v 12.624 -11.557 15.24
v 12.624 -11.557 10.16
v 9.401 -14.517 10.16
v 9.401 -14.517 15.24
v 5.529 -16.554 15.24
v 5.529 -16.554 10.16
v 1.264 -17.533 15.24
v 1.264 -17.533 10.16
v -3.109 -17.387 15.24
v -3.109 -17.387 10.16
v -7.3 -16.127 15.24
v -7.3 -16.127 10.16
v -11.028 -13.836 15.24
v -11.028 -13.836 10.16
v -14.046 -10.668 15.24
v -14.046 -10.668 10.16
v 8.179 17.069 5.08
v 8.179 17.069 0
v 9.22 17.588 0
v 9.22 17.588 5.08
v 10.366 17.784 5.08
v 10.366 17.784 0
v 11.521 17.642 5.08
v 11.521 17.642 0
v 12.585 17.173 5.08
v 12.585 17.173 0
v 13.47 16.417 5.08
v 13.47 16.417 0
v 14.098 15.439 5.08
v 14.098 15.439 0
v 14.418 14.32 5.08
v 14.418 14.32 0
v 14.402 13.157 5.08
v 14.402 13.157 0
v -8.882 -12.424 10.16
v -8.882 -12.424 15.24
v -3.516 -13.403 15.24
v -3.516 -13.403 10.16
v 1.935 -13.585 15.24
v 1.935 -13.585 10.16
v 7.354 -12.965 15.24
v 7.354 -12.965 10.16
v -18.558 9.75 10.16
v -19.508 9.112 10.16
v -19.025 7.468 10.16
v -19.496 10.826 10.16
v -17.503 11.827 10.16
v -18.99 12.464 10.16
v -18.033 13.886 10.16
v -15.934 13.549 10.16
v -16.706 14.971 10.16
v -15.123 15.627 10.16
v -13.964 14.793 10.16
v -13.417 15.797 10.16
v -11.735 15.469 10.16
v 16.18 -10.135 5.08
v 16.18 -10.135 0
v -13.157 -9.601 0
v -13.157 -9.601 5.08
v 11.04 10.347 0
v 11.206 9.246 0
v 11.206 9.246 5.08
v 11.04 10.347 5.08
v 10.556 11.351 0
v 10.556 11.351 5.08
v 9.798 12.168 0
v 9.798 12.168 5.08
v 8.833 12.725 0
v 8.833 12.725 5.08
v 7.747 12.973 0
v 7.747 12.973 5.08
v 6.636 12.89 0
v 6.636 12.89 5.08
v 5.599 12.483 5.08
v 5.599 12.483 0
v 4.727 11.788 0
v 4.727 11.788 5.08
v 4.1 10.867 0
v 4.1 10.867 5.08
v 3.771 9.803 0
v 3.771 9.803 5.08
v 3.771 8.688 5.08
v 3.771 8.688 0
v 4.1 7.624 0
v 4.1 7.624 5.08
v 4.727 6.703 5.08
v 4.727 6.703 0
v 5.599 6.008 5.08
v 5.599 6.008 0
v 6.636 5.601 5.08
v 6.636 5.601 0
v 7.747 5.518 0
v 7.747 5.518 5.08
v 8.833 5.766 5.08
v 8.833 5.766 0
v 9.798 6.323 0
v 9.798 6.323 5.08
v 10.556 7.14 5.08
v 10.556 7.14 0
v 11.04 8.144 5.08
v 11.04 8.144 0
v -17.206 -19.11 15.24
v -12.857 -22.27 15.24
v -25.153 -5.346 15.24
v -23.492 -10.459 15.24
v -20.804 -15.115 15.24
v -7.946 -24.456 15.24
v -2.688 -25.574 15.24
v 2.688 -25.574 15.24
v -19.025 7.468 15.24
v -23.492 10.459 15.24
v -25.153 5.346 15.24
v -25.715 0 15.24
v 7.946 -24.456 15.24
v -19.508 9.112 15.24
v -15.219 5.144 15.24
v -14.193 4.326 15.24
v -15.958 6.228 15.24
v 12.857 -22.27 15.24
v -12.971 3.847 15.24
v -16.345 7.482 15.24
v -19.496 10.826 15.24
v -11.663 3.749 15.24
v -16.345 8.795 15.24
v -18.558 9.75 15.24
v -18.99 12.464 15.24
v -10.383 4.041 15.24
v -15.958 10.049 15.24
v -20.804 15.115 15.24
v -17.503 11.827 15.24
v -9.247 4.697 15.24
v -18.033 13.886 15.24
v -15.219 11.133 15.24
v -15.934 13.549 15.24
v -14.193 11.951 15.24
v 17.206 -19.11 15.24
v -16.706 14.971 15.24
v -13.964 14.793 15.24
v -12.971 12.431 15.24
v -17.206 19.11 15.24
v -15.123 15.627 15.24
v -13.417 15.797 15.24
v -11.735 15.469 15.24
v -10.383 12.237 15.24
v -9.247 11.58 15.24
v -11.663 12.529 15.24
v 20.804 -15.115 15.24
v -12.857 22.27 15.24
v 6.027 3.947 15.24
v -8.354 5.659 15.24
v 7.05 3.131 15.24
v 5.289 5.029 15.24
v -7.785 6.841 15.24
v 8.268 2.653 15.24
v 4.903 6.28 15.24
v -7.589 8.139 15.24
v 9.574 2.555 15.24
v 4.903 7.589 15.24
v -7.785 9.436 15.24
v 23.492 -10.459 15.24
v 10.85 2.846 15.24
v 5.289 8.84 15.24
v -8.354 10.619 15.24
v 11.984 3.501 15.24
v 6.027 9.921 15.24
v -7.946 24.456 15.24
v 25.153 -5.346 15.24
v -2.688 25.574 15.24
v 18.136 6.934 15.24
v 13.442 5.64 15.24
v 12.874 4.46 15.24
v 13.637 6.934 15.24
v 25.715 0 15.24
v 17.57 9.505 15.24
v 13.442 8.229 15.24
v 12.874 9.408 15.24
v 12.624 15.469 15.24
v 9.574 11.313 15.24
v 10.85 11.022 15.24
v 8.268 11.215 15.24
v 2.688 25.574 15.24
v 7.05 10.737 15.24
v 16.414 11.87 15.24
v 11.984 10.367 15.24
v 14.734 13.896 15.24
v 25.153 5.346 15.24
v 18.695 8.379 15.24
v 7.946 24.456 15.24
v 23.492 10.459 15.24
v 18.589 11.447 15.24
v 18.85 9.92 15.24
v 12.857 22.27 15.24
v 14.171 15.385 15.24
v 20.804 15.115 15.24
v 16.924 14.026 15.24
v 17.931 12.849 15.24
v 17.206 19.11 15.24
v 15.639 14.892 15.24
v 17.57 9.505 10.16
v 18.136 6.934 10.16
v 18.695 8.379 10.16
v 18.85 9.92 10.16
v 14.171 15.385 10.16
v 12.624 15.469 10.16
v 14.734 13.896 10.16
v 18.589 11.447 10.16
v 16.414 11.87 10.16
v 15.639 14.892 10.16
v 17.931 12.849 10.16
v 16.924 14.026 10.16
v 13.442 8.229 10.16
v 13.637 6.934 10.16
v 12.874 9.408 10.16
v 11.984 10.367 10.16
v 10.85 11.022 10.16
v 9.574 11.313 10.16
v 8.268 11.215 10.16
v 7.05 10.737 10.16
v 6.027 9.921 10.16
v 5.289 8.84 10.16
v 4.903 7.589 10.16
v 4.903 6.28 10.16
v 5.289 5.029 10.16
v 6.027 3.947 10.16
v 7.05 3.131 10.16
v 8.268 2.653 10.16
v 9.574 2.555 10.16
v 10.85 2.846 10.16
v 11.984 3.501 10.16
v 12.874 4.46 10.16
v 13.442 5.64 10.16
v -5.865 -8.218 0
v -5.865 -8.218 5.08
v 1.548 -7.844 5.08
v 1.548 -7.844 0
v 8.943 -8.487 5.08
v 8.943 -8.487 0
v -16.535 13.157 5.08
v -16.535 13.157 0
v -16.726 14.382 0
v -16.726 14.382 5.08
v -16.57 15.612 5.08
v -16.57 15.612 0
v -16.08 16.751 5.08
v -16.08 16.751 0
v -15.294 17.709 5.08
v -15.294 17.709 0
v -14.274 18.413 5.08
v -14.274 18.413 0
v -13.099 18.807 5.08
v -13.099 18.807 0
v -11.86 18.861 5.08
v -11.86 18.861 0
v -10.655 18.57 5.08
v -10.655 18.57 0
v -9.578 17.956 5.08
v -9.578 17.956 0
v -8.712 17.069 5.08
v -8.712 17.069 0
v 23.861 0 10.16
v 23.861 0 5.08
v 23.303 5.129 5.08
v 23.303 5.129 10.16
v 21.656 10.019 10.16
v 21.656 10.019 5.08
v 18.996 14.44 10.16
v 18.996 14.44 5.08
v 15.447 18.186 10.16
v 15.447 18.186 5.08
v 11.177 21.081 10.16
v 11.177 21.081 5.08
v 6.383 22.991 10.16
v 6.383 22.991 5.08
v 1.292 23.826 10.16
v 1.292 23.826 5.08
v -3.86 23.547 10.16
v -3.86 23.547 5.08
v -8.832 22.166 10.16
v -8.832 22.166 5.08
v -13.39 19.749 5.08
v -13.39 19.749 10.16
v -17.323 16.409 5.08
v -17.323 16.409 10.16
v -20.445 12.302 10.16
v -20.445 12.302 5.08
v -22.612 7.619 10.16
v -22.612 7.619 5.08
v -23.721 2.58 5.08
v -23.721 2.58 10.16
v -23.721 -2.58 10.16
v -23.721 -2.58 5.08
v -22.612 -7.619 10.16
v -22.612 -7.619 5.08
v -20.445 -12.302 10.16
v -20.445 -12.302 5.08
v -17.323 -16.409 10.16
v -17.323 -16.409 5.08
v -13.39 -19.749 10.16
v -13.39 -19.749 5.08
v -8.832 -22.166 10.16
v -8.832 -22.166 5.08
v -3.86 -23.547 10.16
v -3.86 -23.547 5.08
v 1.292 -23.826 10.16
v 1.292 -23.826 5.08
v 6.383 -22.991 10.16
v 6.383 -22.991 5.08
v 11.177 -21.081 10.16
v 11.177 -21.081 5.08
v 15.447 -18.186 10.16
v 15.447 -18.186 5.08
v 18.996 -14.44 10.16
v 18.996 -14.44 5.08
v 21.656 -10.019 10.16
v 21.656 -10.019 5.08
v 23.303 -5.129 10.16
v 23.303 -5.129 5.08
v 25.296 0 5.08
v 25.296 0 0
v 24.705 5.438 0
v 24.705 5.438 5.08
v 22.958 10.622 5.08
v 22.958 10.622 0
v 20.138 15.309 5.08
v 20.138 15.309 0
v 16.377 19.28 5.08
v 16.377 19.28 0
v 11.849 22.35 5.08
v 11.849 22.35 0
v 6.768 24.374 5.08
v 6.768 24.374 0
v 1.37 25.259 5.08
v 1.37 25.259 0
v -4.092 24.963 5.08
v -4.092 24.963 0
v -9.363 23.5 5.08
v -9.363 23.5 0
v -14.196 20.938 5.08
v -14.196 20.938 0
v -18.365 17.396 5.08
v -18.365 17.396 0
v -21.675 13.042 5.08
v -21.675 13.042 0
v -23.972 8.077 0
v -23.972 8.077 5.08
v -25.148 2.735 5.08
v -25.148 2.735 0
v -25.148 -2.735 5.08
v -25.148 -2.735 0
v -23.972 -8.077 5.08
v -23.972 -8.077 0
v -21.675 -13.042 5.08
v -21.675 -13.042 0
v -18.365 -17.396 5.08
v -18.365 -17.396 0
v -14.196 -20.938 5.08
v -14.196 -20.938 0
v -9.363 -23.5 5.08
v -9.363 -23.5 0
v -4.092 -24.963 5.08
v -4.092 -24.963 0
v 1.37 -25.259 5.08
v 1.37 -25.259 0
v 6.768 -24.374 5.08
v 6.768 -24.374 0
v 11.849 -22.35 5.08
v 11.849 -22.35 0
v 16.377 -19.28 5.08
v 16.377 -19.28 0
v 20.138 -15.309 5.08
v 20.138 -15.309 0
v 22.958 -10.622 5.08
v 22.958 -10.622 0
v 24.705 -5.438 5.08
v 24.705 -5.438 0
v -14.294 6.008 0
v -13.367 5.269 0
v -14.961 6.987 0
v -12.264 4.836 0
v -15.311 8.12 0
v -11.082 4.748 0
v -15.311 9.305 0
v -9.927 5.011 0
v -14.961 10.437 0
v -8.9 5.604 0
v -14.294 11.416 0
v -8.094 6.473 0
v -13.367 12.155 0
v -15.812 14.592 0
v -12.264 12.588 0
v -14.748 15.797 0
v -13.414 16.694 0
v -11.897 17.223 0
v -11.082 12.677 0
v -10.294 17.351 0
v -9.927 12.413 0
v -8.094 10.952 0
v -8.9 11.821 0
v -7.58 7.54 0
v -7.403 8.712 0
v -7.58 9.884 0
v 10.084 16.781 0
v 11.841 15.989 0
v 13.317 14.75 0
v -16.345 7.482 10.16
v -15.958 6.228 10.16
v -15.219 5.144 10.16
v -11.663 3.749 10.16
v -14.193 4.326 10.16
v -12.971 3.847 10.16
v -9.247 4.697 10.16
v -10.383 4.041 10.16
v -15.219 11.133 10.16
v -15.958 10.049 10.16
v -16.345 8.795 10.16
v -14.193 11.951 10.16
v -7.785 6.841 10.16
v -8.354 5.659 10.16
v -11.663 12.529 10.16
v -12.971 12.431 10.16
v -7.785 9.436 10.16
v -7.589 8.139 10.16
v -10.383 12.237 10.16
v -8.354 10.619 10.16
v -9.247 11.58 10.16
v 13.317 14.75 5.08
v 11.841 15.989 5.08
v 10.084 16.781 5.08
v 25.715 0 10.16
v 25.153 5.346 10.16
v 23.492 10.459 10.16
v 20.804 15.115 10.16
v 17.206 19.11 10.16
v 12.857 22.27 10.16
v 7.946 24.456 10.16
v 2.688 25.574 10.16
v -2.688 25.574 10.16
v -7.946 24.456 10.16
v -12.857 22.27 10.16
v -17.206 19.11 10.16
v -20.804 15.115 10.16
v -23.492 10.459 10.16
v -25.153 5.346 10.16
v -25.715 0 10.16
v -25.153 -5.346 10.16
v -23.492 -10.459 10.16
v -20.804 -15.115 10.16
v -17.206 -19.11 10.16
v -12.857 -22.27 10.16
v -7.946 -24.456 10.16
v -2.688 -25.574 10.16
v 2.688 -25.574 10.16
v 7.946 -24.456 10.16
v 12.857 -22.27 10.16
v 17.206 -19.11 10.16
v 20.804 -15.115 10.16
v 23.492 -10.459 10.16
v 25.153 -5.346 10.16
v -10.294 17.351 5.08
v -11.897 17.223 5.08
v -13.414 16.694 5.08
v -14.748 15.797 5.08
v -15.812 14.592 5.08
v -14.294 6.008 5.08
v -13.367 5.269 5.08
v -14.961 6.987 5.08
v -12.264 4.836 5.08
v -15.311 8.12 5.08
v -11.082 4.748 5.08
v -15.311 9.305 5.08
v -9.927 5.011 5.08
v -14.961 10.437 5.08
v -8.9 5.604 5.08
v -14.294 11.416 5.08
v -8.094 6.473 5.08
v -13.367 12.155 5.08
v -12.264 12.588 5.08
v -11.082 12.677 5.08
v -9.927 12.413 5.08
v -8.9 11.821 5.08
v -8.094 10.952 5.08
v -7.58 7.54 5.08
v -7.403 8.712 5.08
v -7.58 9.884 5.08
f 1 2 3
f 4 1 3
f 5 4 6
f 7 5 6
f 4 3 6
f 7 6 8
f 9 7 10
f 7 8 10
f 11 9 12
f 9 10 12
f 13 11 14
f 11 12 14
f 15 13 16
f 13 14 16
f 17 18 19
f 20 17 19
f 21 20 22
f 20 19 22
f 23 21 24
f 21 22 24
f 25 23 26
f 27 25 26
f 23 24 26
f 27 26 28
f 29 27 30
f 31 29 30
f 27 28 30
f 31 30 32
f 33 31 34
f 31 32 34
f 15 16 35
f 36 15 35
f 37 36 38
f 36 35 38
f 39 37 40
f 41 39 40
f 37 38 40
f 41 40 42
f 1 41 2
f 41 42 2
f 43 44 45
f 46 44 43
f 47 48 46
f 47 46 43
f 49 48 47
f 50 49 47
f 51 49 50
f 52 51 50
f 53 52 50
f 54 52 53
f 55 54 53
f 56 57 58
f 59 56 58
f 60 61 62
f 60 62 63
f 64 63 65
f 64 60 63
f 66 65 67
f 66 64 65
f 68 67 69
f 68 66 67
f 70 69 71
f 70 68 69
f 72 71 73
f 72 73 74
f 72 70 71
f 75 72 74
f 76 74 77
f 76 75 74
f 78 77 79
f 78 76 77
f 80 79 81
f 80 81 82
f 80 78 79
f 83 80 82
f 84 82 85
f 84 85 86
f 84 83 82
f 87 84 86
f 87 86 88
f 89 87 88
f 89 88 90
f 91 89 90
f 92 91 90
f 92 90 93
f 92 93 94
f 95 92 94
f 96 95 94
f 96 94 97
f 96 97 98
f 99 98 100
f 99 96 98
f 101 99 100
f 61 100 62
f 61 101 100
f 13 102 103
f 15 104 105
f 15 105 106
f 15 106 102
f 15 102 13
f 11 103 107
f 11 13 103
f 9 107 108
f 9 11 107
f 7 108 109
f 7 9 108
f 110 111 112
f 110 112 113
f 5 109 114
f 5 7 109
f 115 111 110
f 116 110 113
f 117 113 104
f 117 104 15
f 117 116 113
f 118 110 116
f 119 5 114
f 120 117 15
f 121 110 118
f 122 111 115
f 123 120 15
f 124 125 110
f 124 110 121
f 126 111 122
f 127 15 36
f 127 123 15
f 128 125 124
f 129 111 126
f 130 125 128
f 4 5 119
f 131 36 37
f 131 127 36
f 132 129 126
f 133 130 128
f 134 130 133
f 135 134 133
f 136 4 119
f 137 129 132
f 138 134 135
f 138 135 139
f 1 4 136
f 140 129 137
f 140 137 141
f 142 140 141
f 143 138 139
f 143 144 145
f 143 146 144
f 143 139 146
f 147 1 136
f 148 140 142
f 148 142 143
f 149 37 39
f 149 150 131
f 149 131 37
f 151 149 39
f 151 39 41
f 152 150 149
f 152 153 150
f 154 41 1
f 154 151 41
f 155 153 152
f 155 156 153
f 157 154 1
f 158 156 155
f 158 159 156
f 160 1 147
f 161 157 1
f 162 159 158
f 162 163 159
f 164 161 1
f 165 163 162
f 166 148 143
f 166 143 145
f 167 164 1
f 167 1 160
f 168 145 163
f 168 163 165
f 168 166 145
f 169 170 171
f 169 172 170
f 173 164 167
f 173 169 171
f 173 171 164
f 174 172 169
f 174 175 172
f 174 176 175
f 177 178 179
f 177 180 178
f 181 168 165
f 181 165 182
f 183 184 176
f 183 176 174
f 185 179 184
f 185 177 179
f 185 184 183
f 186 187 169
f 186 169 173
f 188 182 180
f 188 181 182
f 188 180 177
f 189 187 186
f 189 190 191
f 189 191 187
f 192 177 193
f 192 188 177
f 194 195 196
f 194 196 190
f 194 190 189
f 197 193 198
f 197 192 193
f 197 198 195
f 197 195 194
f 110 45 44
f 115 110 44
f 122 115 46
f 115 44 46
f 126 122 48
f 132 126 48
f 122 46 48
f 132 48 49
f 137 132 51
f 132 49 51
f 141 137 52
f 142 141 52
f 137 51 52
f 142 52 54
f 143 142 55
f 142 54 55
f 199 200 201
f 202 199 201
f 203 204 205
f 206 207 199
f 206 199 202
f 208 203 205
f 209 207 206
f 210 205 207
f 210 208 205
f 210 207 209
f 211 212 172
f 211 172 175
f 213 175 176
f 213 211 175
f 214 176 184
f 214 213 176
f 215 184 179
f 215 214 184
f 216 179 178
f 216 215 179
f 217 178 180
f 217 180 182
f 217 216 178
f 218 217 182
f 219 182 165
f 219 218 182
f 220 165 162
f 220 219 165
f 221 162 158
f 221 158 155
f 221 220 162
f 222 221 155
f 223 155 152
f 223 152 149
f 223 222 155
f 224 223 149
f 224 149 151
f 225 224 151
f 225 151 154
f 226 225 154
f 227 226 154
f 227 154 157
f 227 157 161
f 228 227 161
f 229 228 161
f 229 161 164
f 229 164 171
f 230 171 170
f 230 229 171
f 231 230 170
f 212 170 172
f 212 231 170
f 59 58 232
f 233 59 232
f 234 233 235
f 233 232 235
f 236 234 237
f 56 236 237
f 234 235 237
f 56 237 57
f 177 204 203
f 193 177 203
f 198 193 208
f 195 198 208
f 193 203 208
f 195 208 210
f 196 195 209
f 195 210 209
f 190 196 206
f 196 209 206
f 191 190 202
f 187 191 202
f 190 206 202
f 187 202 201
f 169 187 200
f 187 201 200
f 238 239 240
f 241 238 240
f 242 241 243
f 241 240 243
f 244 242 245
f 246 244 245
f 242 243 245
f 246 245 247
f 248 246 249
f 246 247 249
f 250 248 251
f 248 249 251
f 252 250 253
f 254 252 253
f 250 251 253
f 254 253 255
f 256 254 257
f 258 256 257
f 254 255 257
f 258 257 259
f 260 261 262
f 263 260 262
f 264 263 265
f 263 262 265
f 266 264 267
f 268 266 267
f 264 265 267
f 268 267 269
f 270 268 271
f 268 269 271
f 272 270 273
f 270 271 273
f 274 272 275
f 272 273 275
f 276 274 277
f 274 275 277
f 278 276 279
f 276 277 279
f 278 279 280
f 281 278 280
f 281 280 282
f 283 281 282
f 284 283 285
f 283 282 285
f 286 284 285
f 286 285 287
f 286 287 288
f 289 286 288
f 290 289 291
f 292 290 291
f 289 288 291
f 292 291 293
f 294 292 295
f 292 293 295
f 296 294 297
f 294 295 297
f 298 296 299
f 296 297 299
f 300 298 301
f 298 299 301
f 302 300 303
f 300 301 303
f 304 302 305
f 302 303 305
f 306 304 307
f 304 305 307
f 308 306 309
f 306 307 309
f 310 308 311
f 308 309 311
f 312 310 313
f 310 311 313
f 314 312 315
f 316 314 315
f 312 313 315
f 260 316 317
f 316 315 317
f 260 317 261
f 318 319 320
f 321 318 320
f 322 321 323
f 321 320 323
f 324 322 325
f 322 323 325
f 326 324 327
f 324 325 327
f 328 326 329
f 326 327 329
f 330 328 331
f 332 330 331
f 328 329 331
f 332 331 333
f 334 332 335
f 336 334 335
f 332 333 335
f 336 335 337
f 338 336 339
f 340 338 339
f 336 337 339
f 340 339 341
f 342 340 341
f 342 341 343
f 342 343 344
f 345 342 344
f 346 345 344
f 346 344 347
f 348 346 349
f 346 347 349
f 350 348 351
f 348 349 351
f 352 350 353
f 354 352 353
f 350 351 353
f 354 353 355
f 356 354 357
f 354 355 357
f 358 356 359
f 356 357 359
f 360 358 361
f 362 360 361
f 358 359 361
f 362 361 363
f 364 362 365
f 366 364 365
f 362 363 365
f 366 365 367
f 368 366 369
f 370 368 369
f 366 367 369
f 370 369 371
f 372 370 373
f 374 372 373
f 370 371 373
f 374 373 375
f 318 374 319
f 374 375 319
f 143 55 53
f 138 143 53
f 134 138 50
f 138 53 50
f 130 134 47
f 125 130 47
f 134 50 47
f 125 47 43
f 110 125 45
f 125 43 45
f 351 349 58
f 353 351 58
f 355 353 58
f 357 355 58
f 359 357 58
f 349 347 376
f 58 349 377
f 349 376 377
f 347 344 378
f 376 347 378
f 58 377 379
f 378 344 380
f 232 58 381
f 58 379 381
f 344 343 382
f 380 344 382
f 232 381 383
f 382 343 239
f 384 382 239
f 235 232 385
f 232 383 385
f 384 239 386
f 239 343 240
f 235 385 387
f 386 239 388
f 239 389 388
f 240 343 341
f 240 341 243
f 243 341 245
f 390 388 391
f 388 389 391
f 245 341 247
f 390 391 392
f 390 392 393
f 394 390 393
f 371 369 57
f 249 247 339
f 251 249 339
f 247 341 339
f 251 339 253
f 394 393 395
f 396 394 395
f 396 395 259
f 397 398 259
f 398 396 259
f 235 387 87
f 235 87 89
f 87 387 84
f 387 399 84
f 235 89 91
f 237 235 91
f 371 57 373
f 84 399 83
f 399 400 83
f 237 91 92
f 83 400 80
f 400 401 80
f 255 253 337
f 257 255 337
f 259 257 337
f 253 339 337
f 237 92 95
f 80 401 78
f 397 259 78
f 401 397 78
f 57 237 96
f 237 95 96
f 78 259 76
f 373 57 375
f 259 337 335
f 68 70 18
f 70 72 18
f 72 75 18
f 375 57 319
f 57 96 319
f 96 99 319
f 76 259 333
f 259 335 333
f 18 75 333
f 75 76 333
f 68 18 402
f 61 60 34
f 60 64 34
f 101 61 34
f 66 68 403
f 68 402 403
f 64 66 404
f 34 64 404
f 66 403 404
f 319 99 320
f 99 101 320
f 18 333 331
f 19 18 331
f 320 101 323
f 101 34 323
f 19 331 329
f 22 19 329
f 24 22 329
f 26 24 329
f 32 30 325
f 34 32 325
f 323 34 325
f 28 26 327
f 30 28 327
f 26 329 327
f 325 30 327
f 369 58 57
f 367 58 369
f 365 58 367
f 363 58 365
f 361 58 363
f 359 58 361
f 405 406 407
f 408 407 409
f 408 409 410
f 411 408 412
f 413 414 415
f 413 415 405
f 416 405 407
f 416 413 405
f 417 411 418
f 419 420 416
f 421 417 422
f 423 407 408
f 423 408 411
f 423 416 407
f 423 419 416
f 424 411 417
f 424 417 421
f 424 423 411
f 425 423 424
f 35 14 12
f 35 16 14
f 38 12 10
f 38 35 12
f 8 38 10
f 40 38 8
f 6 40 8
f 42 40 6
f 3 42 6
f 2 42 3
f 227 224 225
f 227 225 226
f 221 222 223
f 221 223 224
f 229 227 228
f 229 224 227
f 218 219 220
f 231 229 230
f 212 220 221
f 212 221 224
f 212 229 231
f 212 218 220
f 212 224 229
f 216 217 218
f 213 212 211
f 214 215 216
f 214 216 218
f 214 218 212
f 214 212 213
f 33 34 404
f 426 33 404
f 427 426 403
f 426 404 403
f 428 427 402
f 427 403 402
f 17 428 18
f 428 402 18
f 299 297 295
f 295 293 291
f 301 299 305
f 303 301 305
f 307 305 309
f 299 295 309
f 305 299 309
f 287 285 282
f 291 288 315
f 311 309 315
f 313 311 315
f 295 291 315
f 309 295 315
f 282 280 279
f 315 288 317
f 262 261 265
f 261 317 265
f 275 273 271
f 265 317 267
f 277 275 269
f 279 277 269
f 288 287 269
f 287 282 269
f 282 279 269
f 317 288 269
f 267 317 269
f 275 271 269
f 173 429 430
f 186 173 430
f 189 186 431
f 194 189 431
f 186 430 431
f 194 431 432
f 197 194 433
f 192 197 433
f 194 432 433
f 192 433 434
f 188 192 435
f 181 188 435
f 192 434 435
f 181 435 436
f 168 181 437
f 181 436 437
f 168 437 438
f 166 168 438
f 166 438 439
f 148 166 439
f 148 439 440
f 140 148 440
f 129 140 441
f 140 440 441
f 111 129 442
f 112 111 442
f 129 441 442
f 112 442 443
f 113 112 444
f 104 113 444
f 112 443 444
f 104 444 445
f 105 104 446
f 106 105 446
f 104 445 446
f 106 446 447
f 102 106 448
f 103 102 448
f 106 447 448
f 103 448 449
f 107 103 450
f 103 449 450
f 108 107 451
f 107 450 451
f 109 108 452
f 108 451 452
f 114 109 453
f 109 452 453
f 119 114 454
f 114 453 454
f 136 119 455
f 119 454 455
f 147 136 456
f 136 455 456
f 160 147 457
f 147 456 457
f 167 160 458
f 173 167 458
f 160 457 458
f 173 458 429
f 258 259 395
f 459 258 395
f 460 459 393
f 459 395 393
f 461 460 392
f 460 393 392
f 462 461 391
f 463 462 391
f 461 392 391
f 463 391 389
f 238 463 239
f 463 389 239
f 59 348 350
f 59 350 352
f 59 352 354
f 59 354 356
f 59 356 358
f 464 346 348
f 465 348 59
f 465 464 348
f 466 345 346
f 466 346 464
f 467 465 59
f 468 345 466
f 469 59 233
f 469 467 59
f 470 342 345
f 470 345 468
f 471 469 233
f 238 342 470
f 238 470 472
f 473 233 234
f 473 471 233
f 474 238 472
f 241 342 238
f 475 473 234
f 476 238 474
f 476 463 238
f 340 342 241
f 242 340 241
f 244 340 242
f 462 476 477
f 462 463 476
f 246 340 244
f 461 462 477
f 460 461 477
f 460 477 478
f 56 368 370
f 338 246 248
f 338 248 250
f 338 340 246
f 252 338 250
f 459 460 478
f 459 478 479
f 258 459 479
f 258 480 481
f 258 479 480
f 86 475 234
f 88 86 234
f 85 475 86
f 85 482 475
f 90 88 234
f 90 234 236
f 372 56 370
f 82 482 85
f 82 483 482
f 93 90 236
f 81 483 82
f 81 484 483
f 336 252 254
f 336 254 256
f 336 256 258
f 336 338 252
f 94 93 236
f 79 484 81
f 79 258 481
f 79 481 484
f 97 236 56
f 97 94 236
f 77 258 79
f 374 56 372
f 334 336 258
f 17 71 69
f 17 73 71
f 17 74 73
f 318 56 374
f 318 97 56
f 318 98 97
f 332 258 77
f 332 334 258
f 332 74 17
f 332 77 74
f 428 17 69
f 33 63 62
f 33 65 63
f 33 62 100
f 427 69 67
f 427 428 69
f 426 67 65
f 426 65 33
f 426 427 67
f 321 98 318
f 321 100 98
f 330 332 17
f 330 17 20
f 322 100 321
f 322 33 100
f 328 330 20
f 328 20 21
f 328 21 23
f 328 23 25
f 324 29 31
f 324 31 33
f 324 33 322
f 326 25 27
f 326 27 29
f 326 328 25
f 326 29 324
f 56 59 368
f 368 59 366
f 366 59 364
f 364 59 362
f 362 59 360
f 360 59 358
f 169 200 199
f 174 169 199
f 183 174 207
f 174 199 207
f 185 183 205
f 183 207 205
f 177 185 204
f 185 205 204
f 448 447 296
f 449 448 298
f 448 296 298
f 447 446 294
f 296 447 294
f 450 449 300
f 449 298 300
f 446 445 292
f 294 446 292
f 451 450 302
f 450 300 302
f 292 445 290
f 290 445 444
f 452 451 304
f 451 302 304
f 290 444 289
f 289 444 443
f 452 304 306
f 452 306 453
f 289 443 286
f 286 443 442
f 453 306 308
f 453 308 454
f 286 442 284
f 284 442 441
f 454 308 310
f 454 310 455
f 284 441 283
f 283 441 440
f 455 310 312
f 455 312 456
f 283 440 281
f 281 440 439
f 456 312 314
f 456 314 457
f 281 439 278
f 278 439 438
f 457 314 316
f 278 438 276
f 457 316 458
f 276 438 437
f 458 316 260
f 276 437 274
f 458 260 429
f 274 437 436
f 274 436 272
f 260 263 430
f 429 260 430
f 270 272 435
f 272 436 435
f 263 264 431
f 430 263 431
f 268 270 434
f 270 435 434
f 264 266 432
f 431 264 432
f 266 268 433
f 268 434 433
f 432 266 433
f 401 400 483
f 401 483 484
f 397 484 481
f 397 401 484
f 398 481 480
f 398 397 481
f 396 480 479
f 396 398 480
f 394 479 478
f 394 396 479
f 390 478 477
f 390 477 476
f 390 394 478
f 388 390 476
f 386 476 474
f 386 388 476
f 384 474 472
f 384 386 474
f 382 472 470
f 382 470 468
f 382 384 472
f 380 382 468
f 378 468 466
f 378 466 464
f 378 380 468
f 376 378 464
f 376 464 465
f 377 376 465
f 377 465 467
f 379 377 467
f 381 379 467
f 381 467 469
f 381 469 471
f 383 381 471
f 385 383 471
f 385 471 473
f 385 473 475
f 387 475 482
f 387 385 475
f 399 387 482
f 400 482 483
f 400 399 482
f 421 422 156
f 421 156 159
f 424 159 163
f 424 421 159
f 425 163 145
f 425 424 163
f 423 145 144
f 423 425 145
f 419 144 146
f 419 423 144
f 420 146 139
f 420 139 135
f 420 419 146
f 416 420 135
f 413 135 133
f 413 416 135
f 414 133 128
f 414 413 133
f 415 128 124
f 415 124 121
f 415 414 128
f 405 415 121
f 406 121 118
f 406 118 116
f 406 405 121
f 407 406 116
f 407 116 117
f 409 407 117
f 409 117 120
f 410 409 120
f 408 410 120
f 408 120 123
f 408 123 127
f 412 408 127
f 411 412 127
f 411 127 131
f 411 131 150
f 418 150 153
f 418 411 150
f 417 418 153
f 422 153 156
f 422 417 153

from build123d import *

# Parameters (mm, degrees)
F0_R     = 25.296386
F0_R_2   = 3.975729
F0_R_3   = 3.738033
F1_DEPTH = 5.08
F2_R     = 23.860999
F3_DEPTH = 5.08
F4_R     = 25.7147
F4_R_2   = 4.402346
F4_R_3   = 4.391337
F4_R_4   = 23.860999
F5_DEPTH = 5.08


with BuildPart() as f1:
    # F0 (on Top) → F1 (new body)
    with BuildSketch(Plane.XY):
        Circle(F0_R)
        with BuildLine():
            ThreePointArc((-13.1572, -9.6012), (1.548091, -7.844396), (16.1798, -10.1346))
            Line((16.1798, -10.1346), (-13.1572, -9.6012))
        make_face(mode=Mode.SUBTRACT)
        with Locations((-11.3792, 8.7122)):
            Circle(F0_R_2, mode=Mode.SUBTRACT)
        with BuildLine():
            ThreePointArc((-16.535399, 13.1572), (-14.273934, 18.413269), (-8.7122, 17.068801))
            ThreePointArc((-8.7122, 17.068801), (-13.414217, 16.693836), (-16.535399, 13.1572))
        make_face(mode=Mode.SUBTRACT)
        with Locations((7.467599, 9.2456)):
            Circle(F0_R_3, mode=Mode.SUBTRACT)
        with BuildLine():
            ThreePointArc((8.1788, 17.068801), (12.585417, 17.173413), (14.4018, 13.1572))
            ThreePointArc((14.4018, 13.1572), (11.840704, 15.988644), (8.1788, 17.068801))
        make_face(mode=Mode.SUBTRACT)
    extrude(amount=F1_DEPTH)


with BuildPart() as f3:
    # F2 (on face) → F3 (new body)
    with BuildSketch(Plane.XY.offset(5.08)):
        Circle(F2_R)
    extrude(amount=F3_DEPTH)

    # F4 (on face) → F5 (join)
    with BuildSketch(Plane.XY.offset(10.16)):
        Circle(F4_R)
        with BuildLine():
            ThreePointArc((12.623799, -11.557001), (-0.927497, -17.601402), (-14.046201, -10.668001))
            ThreePointArc((-14.046201, -10.668001), (-0.793935, -13.594537), (12.623799, -11.557001))
        make_face(mode=Mode.SUBTRACT)
        with BuildLine():
            ThreePointArc((-19.024599, 7.4676), (-18.033072, 13.885616), (-11.7348, 15.4686))
            ThreePointArc((-11.7348, 15.4686), (-16.776449, 12.740694), (-19.024599, 7.4676))
        make_face(mode=Mode.SUBTRACT)
        with Locations((-11.991516, 8.138589)):
            Circle(F4_R_2, mode=Mode.SUBTRACT)
        with Locations((9.2456, 6.9342)):
            Circle(F4_R_3, mode=Mode.SUBTRACT)
        with BuildLine():
            ThreePointArc((12.623799, 15.4686), (17.931254, 12.849279), (18.1356, 6.9342))
            ThreePointArc((18.1356, 6.9342), (16.414225, 11.869532), (12.623799, 15.4686))
        make_face(mode=Mode.SUBTRACT)
        Circle(F4_R_4)
        with BuildLine():
            ThreePointArc((12.623799, -11.557001), (-0.927497, -17.601402), (-14.046201, -10.668001))
            ThreePointArc((-14.046201, -10.668001), (-0.793935, -13.594537), (12.623799, -11.557001))
        make_face(mode=Mode.SUBTRACT)
        with BuildLine():
            ThreePointArc((-19.024599, 7.4676), (-18.033072, 13.885616), (-11.7348, 15.4686))
            ThreePointArc((-11.7348, 15.4686), (-16.776449, 12.740694), (-19.024599, 7.4676))
        make_face(mode=Mode.SUBTRACT)
        with Locations((-11.991516, 8.138589)):
            Circle(F4_R_2, mode=Mode.SUBTRACT)
        with Locations((9.2456, 6.9342)):
            Circle(F4_R_3, mode=Mode.SUBTRACT)
        with BuildLine():
            ThreePointArc((12.623799, 15.4686), (17.931254, 12.849279), (18.1356, 6.9342))
            ThreePointArc((18.1356, 6.9342), (16.414225, 11.869532), (12.623799, 15.4686))
        make_face(mode=Mode.SUBTRACT)
    extrude(amount=F5_DEPTH)


solid = Compound([f1.part, f3.part])
